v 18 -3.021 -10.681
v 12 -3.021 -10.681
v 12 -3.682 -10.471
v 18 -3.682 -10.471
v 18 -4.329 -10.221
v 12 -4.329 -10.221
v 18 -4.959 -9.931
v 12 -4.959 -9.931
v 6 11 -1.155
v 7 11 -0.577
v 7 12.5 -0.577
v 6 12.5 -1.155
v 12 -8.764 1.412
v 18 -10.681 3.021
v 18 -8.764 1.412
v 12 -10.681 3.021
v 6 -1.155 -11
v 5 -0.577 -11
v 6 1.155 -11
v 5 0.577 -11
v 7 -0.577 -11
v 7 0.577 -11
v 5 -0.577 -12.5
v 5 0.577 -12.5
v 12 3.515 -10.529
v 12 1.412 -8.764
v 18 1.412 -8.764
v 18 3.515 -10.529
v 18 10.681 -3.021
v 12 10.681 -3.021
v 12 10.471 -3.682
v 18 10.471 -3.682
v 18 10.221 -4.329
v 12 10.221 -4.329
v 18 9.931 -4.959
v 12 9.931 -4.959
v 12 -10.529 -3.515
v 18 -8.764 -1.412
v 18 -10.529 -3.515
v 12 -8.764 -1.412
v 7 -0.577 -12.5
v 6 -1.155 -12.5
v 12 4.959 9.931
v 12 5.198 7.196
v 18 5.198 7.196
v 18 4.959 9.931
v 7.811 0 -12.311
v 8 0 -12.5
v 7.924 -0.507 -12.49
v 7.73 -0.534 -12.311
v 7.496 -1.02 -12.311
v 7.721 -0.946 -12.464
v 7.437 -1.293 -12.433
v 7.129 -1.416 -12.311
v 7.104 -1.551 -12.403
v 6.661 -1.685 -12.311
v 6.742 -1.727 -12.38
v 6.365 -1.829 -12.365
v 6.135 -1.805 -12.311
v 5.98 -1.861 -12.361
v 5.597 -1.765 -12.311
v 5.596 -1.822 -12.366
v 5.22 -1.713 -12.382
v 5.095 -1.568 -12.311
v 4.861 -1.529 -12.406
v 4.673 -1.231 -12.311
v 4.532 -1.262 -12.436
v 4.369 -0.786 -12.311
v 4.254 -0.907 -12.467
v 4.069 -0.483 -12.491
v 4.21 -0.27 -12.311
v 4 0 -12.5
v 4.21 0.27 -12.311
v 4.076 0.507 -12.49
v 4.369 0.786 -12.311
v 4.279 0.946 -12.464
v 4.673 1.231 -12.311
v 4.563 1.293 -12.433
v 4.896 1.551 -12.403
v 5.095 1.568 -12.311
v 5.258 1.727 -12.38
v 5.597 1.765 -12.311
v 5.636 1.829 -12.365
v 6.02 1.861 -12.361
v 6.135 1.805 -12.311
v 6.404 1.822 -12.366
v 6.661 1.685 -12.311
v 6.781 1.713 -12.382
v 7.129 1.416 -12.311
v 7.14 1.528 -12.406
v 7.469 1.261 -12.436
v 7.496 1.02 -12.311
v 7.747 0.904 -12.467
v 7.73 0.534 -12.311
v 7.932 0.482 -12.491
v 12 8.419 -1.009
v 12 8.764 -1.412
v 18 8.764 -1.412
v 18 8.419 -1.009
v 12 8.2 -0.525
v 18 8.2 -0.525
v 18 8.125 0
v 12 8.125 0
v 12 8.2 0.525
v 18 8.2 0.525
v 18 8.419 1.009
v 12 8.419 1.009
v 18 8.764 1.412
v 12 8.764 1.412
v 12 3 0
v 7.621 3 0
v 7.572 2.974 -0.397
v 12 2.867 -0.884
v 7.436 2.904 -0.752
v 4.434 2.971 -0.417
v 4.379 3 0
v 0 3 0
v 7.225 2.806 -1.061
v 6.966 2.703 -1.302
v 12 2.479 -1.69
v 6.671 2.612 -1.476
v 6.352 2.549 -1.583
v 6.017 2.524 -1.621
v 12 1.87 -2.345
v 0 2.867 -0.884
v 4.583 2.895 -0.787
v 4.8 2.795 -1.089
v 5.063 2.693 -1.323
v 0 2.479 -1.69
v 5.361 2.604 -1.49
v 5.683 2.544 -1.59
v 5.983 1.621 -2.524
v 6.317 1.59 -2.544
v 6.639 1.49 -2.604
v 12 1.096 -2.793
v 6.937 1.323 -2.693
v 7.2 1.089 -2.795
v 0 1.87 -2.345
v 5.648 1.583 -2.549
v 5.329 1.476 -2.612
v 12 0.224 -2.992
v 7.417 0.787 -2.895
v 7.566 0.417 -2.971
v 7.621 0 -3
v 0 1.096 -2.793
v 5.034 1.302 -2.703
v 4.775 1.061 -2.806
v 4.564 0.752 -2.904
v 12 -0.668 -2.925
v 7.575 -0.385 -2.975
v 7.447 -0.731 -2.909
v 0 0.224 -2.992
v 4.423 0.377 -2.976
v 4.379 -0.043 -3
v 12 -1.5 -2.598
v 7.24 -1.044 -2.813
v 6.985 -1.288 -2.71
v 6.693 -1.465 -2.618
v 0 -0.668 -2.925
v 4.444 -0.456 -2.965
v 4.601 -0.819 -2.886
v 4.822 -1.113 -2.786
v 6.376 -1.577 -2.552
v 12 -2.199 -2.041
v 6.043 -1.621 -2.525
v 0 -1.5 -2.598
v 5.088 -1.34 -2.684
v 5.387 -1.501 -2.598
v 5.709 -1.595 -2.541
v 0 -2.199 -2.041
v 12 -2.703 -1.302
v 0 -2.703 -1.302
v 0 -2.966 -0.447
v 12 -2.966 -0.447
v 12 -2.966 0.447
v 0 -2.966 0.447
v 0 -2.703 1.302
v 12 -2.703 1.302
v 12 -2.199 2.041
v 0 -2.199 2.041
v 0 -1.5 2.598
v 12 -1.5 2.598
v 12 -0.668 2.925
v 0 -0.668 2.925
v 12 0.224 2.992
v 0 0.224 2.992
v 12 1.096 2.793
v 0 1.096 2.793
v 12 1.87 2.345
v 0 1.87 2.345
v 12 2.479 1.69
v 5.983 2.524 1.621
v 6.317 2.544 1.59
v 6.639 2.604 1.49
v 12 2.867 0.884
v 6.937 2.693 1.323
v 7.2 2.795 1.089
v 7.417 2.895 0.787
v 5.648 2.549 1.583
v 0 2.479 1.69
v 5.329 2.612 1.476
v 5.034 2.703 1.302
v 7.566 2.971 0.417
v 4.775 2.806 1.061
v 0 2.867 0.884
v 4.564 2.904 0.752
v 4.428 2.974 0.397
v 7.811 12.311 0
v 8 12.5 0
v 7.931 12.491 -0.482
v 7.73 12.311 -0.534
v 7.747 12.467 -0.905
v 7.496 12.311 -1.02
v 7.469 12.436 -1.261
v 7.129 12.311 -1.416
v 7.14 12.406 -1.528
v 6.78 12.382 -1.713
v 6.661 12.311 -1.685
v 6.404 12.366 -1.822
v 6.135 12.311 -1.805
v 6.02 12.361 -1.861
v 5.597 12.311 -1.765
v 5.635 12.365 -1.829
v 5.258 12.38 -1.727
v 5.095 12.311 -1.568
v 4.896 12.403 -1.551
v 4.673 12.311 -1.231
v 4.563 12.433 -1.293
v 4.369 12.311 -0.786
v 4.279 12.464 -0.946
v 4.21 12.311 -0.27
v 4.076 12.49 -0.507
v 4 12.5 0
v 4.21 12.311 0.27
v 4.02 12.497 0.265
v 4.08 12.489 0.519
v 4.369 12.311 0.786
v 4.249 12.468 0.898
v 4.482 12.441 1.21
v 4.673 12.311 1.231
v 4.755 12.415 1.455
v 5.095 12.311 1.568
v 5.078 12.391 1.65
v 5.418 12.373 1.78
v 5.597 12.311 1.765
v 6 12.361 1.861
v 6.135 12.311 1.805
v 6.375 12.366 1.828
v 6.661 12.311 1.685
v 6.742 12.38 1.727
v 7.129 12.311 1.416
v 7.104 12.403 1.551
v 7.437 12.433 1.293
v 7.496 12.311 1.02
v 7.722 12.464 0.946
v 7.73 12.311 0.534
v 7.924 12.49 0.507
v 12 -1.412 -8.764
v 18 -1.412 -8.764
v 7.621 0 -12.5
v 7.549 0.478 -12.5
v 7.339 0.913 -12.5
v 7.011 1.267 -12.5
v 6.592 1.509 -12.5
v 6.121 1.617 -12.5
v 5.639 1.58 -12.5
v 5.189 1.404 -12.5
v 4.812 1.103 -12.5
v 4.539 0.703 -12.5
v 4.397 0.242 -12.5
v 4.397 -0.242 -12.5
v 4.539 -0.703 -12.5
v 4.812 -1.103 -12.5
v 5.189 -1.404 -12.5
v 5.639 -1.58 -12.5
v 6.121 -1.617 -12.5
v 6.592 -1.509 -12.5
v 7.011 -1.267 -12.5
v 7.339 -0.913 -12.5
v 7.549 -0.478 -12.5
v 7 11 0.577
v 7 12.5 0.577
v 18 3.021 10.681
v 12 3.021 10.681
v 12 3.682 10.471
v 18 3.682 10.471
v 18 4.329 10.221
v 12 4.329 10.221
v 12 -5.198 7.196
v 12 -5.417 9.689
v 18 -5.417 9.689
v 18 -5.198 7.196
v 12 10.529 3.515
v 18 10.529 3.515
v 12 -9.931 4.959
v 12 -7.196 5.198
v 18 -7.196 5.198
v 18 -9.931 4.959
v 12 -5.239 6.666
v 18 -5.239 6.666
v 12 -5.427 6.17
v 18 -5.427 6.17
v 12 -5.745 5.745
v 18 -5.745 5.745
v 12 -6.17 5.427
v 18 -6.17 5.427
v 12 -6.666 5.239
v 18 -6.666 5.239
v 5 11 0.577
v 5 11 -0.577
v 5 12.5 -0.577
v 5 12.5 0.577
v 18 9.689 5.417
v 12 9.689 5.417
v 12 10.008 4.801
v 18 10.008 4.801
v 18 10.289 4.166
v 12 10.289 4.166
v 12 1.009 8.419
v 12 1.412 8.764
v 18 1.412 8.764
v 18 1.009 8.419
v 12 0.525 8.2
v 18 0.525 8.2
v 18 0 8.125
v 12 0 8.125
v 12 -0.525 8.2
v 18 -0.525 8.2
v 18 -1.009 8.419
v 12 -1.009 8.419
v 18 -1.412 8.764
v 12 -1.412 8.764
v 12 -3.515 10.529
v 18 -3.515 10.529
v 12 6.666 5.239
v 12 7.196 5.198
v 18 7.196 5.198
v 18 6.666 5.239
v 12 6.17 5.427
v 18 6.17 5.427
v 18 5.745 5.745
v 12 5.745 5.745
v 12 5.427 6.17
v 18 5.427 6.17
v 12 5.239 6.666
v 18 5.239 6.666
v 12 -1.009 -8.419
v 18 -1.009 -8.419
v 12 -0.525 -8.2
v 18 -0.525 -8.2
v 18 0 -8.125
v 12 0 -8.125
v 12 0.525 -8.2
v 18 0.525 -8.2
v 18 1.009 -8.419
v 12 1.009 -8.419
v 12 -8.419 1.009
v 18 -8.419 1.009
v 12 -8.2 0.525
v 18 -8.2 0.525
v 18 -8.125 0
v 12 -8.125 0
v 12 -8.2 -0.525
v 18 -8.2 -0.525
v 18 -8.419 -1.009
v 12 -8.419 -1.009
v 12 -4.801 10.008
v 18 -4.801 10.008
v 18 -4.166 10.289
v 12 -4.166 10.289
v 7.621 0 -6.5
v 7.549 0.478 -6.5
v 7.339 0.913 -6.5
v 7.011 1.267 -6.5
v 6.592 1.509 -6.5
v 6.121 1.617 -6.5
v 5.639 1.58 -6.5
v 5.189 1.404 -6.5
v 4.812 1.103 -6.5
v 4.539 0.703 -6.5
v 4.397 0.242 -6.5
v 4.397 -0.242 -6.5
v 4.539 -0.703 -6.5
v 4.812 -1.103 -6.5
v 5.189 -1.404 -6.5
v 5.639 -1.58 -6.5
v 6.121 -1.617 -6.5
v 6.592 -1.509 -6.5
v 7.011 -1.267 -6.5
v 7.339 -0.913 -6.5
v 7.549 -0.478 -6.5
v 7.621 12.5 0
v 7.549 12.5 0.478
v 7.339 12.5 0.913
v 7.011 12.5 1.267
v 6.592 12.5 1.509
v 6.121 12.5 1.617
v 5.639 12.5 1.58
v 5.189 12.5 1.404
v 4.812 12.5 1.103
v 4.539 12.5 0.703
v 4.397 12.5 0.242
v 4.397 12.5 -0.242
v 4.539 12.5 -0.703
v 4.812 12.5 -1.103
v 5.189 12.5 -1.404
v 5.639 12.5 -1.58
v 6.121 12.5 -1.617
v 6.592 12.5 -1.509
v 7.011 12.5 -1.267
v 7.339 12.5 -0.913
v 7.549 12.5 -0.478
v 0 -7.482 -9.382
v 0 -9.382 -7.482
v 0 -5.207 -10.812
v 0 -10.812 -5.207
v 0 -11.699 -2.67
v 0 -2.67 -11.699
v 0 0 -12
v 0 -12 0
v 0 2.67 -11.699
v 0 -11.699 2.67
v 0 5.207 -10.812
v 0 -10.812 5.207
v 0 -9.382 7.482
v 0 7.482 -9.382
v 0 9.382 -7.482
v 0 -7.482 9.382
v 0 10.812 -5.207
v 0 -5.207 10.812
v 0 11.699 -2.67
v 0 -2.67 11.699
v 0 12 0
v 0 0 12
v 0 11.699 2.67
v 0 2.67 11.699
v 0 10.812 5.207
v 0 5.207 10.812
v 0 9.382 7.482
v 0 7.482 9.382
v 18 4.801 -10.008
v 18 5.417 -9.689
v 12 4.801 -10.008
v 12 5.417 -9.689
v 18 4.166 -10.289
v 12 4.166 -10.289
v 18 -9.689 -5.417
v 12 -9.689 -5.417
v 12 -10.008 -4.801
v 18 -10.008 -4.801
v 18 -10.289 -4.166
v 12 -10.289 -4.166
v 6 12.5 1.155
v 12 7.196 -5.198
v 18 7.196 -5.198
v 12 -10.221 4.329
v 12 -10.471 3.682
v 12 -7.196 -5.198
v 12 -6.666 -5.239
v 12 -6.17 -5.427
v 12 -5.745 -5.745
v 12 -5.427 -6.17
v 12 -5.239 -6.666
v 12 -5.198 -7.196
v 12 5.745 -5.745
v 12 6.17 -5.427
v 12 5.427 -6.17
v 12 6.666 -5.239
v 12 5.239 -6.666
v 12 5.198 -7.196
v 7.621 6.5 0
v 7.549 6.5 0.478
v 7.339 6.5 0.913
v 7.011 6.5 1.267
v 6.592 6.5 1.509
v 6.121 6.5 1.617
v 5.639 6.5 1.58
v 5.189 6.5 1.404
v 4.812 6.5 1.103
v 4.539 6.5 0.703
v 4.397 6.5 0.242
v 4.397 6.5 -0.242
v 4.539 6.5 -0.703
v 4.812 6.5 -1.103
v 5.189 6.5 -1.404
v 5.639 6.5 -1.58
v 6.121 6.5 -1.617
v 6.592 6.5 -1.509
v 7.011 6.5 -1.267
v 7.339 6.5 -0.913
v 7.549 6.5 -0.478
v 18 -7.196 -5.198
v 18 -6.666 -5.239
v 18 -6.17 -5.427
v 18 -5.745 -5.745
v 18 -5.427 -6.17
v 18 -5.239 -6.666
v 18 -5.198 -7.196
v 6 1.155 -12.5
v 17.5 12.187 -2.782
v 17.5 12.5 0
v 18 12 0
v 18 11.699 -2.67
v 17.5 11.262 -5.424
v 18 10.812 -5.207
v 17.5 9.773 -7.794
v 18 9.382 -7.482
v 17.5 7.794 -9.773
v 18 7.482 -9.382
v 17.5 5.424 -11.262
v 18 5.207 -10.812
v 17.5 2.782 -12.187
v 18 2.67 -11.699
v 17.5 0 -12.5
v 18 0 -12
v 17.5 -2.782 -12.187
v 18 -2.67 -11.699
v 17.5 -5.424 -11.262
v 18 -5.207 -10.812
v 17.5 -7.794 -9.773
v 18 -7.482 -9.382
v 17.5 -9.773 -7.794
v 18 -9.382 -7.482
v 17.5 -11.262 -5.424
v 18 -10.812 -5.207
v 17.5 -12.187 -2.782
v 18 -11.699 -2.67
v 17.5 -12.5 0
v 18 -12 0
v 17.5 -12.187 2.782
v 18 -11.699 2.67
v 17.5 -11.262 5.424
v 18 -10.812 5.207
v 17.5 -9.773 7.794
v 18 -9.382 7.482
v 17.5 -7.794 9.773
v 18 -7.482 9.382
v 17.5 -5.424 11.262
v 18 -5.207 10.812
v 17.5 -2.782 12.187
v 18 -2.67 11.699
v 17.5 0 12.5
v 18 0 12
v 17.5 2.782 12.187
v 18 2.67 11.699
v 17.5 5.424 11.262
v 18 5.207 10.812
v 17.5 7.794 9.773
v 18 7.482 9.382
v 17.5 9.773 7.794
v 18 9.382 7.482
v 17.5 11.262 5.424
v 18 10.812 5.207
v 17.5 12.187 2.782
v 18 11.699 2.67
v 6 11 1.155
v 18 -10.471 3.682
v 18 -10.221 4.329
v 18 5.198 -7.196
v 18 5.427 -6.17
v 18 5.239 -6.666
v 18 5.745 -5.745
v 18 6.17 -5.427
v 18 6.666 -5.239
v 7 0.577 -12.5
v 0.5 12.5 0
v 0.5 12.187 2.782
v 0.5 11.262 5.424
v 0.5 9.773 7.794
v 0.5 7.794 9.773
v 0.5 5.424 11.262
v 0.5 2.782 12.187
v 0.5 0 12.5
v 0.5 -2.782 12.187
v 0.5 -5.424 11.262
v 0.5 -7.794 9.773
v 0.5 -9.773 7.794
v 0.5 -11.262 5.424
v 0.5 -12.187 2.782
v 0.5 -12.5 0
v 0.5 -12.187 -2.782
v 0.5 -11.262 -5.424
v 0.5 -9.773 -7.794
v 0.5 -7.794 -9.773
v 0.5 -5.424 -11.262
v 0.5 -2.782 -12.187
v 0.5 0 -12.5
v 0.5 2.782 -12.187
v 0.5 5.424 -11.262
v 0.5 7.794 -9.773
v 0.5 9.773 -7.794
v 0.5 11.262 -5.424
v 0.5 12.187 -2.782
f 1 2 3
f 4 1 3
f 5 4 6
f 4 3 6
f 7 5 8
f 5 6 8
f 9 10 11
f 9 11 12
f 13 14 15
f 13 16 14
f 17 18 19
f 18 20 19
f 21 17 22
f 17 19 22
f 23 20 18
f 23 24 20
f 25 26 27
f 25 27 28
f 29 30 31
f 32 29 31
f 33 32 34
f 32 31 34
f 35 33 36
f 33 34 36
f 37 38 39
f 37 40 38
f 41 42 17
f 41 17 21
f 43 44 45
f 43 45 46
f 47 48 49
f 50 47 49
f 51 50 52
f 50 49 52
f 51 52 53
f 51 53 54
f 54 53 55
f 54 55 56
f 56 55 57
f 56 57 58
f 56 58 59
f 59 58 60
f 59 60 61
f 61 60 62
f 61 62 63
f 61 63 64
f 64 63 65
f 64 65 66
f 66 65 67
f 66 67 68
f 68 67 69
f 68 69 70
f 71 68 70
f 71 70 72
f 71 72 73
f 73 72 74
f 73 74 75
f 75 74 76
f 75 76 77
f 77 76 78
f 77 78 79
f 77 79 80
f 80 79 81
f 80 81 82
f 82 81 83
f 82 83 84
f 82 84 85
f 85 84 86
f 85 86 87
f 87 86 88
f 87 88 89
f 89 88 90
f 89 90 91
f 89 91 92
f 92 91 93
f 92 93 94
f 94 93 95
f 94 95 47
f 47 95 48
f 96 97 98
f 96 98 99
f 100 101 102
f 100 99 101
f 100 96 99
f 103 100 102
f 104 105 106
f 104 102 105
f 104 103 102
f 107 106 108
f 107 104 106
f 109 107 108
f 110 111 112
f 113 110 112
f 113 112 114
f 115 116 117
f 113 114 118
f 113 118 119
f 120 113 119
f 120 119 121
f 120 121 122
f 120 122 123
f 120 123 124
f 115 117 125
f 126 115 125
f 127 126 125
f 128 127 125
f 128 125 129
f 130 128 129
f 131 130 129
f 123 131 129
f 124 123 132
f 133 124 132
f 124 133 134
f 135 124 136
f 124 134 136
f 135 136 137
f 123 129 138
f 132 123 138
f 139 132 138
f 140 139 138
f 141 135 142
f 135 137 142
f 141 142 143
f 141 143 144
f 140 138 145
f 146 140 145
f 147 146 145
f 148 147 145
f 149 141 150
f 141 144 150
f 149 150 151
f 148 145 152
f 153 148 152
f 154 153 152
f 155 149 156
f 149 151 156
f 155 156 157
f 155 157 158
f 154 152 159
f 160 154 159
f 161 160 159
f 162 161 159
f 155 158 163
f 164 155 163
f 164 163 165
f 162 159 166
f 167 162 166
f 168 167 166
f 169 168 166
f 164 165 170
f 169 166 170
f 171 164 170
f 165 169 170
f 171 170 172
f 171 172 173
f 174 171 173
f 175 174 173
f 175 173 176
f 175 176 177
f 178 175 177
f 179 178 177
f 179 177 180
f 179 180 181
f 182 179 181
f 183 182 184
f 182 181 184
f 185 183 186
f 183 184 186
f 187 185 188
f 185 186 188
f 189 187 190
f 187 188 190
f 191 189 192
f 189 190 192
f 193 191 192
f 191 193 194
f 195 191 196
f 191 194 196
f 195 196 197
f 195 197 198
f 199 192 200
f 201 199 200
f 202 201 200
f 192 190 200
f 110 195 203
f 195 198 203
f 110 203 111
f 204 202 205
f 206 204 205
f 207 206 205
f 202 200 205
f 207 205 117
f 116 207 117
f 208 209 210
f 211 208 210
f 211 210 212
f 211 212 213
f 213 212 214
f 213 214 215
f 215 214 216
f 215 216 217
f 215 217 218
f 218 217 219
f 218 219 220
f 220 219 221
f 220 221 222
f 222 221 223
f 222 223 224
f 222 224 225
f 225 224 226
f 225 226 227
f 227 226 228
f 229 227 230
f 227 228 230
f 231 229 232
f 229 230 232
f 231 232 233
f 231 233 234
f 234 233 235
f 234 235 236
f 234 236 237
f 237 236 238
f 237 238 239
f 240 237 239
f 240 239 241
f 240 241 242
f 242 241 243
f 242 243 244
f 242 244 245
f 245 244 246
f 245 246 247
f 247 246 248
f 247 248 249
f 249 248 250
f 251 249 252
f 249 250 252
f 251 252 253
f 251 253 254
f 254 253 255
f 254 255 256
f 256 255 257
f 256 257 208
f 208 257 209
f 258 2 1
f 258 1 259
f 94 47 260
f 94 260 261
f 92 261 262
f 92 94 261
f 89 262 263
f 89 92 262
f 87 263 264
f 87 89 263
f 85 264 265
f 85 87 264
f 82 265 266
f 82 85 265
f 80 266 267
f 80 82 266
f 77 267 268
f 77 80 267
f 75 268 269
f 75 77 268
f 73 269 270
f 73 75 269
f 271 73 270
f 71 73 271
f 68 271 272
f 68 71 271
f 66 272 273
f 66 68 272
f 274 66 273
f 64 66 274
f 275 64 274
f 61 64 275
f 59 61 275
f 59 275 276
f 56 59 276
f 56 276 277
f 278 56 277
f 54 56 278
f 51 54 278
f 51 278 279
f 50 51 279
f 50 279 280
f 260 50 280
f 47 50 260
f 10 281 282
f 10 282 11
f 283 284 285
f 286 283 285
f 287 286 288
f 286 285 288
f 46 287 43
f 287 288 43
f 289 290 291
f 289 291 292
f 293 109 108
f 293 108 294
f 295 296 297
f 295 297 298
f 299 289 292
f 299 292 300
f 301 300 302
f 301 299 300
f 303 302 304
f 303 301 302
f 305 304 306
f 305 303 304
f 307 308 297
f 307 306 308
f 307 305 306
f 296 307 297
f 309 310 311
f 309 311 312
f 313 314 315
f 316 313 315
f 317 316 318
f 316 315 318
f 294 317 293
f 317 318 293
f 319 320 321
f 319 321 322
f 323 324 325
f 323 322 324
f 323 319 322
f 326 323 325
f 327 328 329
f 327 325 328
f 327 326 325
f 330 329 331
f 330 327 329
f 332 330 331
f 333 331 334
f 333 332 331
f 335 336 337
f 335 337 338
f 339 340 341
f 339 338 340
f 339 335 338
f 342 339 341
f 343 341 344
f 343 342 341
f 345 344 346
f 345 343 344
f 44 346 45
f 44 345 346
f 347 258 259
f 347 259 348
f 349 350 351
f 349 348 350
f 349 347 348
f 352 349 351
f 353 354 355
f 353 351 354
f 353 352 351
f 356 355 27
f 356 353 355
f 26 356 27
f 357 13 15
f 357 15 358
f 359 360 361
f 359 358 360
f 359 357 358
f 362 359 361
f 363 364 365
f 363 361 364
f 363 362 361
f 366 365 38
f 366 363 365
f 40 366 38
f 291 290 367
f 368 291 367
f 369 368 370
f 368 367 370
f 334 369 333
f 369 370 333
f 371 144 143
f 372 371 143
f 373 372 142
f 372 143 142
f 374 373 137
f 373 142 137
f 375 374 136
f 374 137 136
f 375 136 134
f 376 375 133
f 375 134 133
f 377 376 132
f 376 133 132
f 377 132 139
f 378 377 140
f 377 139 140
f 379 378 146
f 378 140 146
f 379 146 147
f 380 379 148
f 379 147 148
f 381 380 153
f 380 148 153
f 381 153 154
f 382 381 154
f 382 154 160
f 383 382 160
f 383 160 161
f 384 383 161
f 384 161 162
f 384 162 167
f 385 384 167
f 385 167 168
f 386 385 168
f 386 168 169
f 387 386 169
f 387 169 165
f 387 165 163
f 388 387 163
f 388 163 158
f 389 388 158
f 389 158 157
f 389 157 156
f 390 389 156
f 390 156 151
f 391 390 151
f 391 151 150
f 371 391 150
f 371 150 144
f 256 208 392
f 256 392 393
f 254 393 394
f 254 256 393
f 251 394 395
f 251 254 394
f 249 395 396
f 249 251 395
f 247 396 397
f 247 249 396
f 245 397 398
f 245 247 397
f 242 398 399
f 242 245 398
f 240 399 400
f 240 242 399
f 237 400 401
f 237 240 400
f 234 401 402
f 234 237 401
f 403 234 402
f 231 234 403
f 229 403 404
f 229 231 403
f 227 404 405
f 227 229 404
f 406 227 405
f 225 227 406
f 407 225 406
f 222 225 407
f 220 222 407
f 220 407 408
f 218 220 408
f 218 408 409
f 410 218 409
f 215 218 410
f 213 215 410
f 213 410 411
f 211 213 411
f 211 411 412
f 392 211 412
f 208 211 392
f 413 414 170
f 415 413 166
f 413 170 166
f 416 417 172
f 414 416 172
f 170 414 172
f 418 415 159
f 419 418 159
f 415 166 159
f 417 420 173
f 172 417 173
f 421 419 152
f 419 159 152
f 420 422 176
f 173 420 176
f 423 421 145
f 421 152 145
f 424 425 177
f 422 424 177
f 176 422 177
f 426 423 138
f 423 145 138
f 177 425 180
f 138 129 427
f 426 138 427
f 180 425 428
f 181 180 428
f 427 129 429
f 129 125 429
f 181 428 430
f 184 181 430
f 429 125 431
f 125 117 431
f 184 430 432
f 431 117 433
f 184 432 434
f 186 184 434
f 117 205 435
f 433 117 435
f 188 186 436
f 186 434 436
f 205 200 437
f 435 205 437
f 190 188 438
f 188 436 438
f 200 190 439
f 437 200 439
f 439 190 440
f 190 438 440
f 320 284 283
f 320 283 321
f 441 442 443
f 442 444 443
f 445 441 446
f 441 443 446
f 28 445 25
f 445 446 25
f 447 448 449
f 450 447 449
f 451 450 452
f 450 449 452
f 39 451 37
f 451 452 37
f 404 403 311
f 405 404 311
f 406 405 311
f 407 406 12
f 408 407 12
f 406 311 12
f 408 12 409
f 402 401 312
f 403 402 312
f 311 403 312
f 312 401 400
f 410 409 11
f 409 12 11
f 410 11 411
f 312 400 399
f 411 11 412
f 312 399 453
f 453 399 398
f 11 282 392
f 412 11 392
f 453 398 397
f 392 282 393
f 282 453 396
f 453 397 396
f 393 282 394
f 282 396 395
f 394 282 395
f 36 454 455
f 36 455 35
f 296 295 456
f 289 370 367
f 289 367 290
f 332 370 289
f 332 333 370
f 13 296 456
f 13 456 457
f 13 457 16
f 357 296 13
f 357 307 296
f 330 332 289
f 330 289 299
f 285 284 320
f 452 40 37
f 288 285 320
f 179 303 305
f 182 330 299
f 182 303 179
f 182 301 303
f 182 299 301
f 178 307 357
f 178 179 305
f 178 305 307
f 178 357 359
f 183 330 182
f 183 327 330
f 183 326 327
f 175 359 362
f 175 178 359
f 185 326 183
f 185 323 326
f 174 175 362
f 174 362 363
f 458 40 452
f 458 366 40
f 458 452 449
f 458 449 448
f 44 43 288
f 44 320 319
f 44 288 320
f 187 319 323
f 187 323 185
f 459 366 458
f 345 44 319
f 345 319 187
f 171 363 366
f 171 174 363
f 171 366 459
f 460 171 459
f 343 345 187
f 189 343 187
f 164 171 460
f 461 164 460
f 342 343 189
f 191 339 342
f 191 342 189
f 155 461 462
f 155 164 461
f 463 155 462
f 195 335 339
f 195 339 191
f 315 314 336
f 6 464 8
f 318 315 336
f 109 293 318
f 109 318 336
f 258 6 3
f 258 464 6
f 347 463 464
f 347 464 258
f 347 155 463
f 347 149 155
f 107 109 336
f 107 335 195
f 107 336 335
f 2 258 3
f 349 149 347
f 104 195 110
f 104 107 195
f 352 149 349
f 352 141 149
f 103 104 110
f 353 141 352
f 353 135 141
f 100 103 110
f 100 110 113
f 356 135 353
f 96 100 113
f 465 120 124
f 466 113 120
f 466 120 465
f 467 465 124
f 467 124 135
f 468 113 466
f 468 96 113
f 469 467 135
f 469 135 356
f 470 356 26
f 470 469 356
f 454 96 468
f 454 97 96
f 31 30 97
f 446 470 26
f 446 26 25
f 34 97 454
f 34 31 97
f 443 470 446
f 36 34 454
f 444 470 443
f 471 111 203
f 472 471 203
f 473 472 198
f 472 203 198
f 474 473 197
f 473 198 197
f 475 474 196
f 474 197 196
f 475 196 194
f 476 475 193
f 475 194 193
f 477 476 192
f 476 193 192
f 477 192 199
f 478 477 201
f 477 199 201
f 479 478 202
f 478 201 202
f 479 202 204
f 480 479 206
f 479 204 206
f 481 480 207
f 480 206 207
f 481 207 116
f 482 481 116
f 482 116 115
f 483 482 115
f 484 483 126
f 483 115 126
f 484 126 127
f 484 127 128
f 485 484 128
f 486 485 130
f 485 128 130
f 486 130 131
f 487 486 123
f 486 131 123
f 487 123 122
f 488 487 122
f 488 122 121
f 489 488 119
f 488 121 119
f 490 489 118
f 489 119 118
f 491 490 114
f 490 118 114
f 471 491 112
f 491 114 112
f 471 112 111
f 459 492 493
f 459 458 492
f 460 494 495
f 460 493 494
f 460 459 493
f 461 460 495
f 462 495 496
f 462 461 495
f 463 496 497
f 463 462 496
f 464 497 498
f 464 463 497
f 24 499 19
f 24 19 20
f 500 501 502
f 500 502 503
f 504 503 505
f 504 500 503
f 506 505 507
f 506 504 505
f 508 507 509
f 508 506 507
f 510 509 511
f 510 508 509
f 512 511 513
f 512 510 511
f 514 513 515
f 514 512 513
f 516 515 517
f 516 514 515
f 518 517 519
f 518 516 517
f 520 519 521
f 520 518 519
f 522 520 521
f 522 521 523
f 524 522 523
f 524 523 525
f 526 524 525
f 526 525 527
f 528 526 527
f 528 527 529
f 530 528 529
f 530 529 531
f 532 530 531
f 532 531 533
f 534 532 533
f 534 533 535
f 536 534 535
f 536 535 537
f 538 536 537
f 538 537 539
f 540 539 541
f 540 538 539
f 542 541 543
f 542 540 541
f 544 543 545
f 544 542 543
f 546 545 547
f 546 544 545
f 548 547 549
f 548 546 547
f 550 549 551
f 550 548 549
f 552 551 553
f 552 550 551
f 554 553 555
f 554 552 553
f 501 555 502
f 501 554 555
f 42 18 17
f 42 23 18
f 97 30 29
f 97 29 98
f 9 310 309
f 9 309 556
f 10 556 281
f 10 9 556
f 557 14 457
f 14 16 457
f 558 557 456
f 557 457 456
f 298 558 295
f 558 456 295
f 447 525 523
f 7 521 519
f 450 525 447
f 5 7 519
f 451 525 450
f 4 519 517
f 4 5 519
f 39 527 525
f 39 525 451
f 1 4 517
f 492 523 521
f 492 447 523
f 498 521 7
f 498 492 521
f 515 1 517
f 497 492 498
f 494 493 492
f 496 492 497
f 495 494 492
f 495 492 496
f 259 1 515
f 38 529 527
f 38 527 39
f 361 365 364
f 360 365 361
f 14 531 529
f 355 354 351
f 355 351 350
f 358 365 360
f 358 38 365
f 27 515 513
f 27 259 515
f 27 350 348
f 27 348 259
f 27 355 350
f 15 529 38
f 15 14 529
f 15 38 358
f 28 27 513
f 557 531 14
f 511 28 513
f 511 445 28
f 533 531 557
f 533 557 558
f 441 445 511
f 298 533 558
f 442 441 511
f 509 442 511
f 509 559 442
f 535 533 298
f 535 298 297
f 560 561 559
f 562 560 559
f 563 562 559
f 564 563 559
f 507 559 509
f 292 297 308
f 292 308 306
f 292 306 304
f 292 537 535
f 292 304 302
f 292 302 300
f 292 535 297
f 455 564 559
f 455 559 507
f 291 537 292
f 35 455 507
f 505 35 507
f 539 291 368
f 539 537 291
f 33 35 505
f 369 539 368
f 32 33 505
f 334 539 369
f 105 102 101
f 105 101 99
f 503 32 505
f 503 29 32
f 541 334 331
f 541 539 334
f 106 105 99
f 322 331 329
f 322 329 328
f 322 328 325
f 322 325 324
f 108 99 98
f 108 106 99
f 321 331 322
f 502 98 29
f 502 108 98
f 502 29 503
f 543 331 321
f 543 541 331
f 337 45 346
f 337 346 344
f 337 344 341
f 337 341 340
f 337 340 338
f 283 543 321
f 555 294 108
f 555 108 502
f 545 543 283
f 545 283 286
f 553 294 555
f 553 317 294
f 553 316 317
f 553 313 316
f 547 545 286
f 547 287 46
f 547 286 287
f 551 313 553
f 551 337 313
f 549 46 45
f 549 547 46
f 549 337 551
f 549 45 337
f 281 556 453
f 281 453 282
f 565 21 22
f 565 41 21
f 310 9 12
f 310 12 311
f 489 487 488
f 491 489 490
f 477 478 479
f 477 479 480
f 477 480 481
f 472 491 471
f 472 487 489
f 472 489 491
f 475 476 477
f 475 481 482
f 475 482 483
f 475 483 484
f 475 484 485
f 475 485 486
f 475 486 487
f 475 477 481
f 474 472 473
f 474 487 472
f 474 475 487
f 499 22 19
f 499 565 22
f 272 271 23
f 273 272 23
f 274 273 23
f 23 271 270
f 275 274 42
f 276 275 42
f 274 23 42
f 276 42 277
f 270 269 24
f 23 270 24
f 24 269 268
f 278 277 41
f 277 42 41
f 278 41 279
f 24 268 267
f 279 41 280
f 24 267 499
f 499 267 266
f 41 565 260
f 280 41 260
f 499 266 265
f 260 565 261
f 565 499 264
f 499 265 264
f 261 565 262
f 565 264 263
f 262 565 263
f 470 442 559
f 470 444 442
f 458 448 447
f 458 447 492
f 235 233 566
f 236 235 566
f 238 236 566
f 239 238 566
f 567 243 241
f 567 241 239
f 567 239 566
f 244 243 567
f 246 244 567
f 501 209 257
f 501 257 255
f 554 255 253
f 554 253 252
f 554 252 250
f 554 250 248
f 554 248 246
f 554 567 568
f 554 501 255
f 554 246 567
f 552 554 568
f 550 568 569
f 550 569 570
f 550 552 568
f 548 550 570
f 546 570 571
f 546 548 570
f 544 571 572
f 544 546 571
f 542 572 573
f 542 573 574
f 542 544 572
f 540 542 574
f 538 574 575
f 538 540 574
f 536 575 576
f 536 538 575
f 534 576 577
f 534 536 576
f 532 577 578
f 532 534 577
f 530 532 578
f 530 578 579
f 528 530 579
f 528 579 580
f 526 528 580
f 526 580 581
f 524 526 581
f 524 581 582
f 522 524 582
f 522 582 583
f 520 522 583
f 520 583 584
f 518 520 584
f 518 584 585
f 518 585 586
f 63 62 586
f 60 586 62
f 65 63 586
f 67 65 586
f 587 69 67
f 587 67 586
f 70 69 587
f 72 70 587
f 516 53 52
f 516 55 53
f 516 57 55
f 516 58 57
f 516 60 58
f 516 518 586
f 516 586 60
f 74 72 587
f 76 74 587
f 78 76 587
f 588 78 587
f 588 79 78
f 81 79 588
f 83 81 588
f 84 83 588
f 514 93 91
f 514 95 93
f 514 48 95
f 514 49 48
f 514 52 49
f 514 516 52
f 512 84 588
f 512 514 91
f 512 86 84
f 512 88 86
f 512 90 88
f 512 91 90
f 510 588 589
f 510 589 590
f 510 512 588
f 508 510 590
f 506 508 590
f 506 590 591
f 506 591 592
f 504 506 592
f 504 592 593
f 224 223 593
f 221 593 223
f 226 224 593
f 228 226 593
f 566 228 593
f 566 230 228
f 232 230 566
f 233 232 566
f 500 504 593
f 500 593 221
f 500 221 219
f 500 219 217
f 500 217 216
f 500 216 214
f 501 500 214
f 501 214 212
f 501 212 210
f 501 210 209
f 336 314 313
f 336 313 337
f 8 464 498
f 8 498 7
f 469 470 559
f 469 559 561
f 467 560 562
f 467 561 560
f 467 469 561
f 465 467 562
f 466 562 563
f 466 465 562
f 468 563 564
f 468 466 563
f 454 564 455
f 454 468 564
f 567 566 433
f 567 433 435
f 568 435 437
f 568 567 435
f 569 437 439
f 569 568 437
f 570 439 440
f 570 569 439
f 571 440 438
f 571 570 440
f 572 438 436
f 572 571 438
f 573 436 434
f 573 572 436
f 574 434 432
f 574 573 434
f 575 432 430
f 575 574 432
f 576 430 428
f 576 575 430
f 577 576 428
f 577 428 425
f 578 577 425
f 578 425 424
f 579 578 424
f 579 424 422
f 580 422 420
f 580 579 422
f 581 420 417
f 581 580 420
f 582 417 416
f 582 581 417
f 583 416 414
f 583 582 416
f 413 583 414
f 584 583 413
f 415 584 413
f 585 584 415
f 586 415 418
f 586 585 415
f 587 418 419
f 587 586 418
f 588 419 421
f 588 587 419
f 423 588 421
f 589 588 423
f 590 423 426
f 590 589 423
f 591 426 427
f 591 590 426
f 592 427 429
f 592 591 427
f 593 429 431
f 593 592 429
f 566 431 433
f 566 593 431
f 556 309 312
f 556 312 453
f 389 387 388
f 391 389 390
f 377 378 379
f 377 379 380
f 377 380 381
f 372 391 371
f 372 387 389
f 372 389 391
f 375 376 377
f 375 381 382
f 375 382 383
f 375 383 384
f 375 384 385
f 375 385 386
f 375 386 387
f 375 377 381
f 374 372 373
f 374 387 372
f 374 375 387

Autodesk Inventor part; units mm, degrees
sketch "Sketch_1" plane through (0, 0, 0) normal (0, 0, 1) x (1, 0, 0)
  line L0 (18, 0) -> (0, 0)
  line L1 (0, 0) -> (0, 12)
  line L2 (0, 12) -> (0.5, 12.5)
  line L3 (0.5, 12.5) -> (17.5, 12.5)
  line L4 (17.5, 12.5) -> (18, 12)
  line L5 (18, 12) -> (18, 0)
  line L6 (18, 0) -> (0, 0)
revolve "Revolution1" add sketch "Sketch_1" angle 360 about axis through (18, 0, 0) along (1, 0, 0)
sketch "Sketch_2" plane through (12, 0, 0) normal (1, 0, 0) x (0, 0, -1)
  line L0 (-10.681, 3.0208) -> (-8.764, 1.4122)
  arc A0 (-8.764, -1.4122) -> (-8.764, 1.4122) centre (-10.005, 0) ccw
  line L1 (-8.764, -1.4122) -> (-10.5287, -3.5153)
  arc A1 (-10.5287, -3.5153) -> (-9.6887, -5.4166) centre (0, 0) ccw
  line L2 (-9.6887, -5.4166) -> (-7.1956, -5.1985)
  arc A2 (-5.1985, -7.1956) -> (-7.1956, -5.1985) centre (-7.0746, -7.0746) ccw
  line L3 (-5.1985, -7.1956) -> (-4.9592, -9.9306)
  arc A3 (-4.9592, -9.9306) -> (-3.0208, -10.681) centre (0, 0) ccw
  line L4 (-3.0208, -10.681) -> (-1.4122, -8.764)
  arc A4 (1.4122, -8.764) -> (-1.4122, -8.764) centre (0, -10.005) ccw
  line L5 (1.4122, -8.764) -> (3.5153, -10.5287)
  arc A5 (3.5153, -10.5287) -> (5.4166, -9.6887) centre (0, 0) ccw
  line L6 (5.4166, -9.6887) -> (5.1985, -7.1956)
  arc A6 (7.1956, -5.1985) -> (5.1985, -7.1956) centre (7.0746, -7.0746) ccw
  line L7 (7.1956, -5.1985) -> (9.9306, -4.9592)
  arc A7 (9.9306, -4.9592) -> (10.681, -3.0208) centre (0, 0) ccw
  line L8 (10.681, -3.0208) -> (8.764, -1.4122)
  arc A8 (8.764, 1.4122) -> (8.764, -1.4122) centre (10.005, 0) ccw
  line L9 (8.764, 1.4122) -> (10.5287, 3.5153)
  arc A9 (10.5287, 3.5153) -> (9.6887, 5.4166) centre (0, 0) ccw
  line L10 (9.6887, 5.4166) -> (7.1956, 5.1985)
  arc A10 (5.1985, 7.1956) -> (7.1956, 5.1985) centre (7.0746, 7.0746) ccw
  line L11 (5.1985, 7.1956) -> (4.9592, 9.9306)
  arc A11 (4.9592, 9.9306) -> (3.0208, 10.681) centre (0, 0) ccw
  line L12 (3.0208, 10.681) -> (1.4122, 8.764)
  arc A12 (-1.4122, 8.764) -> (1.4122, 8.764) centre (0, 10.005) ccw
  line L13 (-1.4122, 8.764) -> (-3.5153, 10.5287)
  arc A13 (-3.5153, 10.5287) -> (-5.4166, 9.6887) centre (0, 0) ccw
  line L14 (-5.4166, 9.6887) -> (-5.1985, 7.1956)
  arc A14 (-7.1956, 5.1985) -> (-5.1985, 7.1956) centre (-7.0746, 7.0746) ccw
  line L15 (-7.1956, 5.1985) -> (-9.9306, 4.9592)
  arc A15 (-9.9306, 4.9592) -> (-10.681, 3.0208) centre (0, 0) ccw
extrude "Extrusion1" cut sketch "Sketch_2" along normal blind 6
sketch "Sketch_3" plane through (0, 0, 0) normal (1, 0, 0) x (0, 1, 0)
  circle A0 centre (0, 0) radius 3
extrude "Extrusion2" cut sketch "Sketch_3" along normal mid plane 34
sketch "Sketch_4" plane through (0, 0, 0) normal (0, 0, 1) x (1, 0, 0)
  line L0 (6, 0) -> (6, 12.5)
  line L1 (6, 12.5) -> (8, 12.5)
  line L2 (8, 12.5) -> (7.6211, 12.1211)
  line L3 (7.6211, 12.1211) -> (7.6211, 0.3789)
  line L4 (7.6211, 0.3789) -> (8, 0)
  line L5 (8, 0) -> (6, 0)
  line L6 (6, 0) -> (6, 12.5)
revolve "Revolution2" cut sketch "Sketch_4" angle 360 about axis through (6, 0, 0) along (0, -1, 0)
sketch "Sketch_6" plane through (0, 0, 0) normal (0, 1, 0) x (-1, 0, 0)
  line L0 (-6, 0) -> (-6, -12.5)
  line L1 (-6, -12.5) -> (-8, -12.5)
  line L2 (-8, -12.5) -> (-7.6211, -12.1211)
  line L3 (-7.6211, -12.1211) -> (-7.6211, -0.3789)
  line L4 (-7.6211, -0.3789) -> (-8, 0)
  line L5 (-8, 0) -> (-6, 0)
  line L6 (-6, 0) -> (-6, -12.5)
revolve "Revolution3" cut sketch "Sketch_6" angle 360 about axis through (6, 0, 0) along (0, 0, 1)
sketch "Sketch_8" plane through (0, 0, 0) normal (0, 0, 1) x (1, 0, 0)
  line L0 (6, 6.5) -> (6, 12.5)
  line L1 (6, 12.5) -> (7.6211, 12.5)
  line L2 (7.6211, 12.5) -> (8, 12.1211)
  line L3 (8, 12.1211) -> (8, 6.8789)
  line L4 (8, 6.8789) -> (7.6211, 6.5)
  line L5 (7.6211, 6.5) -> (6, 6.5)
  line L6 (6, 6.5) -> (6, 12.5)
revolve "Revolution4" add sketch "Sketch_8" angle 360 about axis through (6, 6.5, 0) along (0, -1, 0)
sketch "Sketch_5" plane through (0, 11, 0) normal (0, 1, 0) x (1, 0, 0)
  line L0 (5, -0.5774) -> (6, -1.1547)
  line L1 (6, -1.1547) -> (7, -0.5774)
  line L2 (7, -0.5774) -> (7, 0.5774)
  line L3 (7, 0.5774) -> (6, 1.1547)
  line L4 (6, 1.1547) -> (5, 0.5774)
  line L5 (5, 0.5774) -> (5, -0.5774)
extrude "Extrusion3" cut sketch "Sketch_5" along normal blind 1.5
sketch "Sketch_7" plane through (0, 0, 0) normal (0, 1, 0) x (-1, 0, 0)
  line L0 (-6, -6.5) -> (-6, -12.5)
  line L1 (-6, -12.5) -> (-7.6211, -12.5)
  line L2 (-7.6211, -12.5) -> (-8, -12.1211)
  line L3 (-8, -12.1211) -> (-8, -6.8789)
  line L4 (-8, -6.8789) -> (-7.6211, -6.5)
  line L5 (-7.6211, -6.5) -> (-6, -6.5)
  line L6 (-6, -6.5) -> (-6, -12.5)
revolve "Revolution5" add sketch "Sketch_7" angle 360 about axis through (6, 0, -6.5) along (0, 0, 1)
sketch "Sketch_9" plane through (0, 0, -12.5) normal (0, 0, 1) x (1, 0, 0)
  line L0 (5, -0.5774) -> (6, -1.1547)
  line L1 (6, -1.1547) -> (7, -0.5774)
  line L2 (7, -0.5774) -> (7, 0.5774)
  line L3 (7, 0.5774) -> (6, 1.1547)
  line L4 (6, 1.1547) -> (5, 0.5774)
  line L5 (5, 0.5774) -> (5, -0.5774)
extrude "Extrusion4" cut sketch "Sketch_9" along normal blind 1.5
ref_plane "left_XY" through (12, 0, 0) normal (1, 0, 0) x (0, 0, -1)
ref_plane "left_YZ" through (12, 0, 0) normal (0, 0, -1) x (0, 1, 0)
ref_plane "left_ZX" through (12, 0, 0) normal (0, 1, 0) x (1, 0, 0)
ref_plane "left_dummy_XY" through (0, 0, 0) normal (1, 0, 0) x (0, 0, -1)
ref_plane "left_dummy_YZ" through (0, 0, 0) normal (0, 0, -1) x (0, 1, 0)
ref_plane "left_dummy_ZX" through (0, 0, 0) normal (0, 1, 0) x (1, 0, 0)
properties part number "MSF-25 - 6-8 Casing 1"
